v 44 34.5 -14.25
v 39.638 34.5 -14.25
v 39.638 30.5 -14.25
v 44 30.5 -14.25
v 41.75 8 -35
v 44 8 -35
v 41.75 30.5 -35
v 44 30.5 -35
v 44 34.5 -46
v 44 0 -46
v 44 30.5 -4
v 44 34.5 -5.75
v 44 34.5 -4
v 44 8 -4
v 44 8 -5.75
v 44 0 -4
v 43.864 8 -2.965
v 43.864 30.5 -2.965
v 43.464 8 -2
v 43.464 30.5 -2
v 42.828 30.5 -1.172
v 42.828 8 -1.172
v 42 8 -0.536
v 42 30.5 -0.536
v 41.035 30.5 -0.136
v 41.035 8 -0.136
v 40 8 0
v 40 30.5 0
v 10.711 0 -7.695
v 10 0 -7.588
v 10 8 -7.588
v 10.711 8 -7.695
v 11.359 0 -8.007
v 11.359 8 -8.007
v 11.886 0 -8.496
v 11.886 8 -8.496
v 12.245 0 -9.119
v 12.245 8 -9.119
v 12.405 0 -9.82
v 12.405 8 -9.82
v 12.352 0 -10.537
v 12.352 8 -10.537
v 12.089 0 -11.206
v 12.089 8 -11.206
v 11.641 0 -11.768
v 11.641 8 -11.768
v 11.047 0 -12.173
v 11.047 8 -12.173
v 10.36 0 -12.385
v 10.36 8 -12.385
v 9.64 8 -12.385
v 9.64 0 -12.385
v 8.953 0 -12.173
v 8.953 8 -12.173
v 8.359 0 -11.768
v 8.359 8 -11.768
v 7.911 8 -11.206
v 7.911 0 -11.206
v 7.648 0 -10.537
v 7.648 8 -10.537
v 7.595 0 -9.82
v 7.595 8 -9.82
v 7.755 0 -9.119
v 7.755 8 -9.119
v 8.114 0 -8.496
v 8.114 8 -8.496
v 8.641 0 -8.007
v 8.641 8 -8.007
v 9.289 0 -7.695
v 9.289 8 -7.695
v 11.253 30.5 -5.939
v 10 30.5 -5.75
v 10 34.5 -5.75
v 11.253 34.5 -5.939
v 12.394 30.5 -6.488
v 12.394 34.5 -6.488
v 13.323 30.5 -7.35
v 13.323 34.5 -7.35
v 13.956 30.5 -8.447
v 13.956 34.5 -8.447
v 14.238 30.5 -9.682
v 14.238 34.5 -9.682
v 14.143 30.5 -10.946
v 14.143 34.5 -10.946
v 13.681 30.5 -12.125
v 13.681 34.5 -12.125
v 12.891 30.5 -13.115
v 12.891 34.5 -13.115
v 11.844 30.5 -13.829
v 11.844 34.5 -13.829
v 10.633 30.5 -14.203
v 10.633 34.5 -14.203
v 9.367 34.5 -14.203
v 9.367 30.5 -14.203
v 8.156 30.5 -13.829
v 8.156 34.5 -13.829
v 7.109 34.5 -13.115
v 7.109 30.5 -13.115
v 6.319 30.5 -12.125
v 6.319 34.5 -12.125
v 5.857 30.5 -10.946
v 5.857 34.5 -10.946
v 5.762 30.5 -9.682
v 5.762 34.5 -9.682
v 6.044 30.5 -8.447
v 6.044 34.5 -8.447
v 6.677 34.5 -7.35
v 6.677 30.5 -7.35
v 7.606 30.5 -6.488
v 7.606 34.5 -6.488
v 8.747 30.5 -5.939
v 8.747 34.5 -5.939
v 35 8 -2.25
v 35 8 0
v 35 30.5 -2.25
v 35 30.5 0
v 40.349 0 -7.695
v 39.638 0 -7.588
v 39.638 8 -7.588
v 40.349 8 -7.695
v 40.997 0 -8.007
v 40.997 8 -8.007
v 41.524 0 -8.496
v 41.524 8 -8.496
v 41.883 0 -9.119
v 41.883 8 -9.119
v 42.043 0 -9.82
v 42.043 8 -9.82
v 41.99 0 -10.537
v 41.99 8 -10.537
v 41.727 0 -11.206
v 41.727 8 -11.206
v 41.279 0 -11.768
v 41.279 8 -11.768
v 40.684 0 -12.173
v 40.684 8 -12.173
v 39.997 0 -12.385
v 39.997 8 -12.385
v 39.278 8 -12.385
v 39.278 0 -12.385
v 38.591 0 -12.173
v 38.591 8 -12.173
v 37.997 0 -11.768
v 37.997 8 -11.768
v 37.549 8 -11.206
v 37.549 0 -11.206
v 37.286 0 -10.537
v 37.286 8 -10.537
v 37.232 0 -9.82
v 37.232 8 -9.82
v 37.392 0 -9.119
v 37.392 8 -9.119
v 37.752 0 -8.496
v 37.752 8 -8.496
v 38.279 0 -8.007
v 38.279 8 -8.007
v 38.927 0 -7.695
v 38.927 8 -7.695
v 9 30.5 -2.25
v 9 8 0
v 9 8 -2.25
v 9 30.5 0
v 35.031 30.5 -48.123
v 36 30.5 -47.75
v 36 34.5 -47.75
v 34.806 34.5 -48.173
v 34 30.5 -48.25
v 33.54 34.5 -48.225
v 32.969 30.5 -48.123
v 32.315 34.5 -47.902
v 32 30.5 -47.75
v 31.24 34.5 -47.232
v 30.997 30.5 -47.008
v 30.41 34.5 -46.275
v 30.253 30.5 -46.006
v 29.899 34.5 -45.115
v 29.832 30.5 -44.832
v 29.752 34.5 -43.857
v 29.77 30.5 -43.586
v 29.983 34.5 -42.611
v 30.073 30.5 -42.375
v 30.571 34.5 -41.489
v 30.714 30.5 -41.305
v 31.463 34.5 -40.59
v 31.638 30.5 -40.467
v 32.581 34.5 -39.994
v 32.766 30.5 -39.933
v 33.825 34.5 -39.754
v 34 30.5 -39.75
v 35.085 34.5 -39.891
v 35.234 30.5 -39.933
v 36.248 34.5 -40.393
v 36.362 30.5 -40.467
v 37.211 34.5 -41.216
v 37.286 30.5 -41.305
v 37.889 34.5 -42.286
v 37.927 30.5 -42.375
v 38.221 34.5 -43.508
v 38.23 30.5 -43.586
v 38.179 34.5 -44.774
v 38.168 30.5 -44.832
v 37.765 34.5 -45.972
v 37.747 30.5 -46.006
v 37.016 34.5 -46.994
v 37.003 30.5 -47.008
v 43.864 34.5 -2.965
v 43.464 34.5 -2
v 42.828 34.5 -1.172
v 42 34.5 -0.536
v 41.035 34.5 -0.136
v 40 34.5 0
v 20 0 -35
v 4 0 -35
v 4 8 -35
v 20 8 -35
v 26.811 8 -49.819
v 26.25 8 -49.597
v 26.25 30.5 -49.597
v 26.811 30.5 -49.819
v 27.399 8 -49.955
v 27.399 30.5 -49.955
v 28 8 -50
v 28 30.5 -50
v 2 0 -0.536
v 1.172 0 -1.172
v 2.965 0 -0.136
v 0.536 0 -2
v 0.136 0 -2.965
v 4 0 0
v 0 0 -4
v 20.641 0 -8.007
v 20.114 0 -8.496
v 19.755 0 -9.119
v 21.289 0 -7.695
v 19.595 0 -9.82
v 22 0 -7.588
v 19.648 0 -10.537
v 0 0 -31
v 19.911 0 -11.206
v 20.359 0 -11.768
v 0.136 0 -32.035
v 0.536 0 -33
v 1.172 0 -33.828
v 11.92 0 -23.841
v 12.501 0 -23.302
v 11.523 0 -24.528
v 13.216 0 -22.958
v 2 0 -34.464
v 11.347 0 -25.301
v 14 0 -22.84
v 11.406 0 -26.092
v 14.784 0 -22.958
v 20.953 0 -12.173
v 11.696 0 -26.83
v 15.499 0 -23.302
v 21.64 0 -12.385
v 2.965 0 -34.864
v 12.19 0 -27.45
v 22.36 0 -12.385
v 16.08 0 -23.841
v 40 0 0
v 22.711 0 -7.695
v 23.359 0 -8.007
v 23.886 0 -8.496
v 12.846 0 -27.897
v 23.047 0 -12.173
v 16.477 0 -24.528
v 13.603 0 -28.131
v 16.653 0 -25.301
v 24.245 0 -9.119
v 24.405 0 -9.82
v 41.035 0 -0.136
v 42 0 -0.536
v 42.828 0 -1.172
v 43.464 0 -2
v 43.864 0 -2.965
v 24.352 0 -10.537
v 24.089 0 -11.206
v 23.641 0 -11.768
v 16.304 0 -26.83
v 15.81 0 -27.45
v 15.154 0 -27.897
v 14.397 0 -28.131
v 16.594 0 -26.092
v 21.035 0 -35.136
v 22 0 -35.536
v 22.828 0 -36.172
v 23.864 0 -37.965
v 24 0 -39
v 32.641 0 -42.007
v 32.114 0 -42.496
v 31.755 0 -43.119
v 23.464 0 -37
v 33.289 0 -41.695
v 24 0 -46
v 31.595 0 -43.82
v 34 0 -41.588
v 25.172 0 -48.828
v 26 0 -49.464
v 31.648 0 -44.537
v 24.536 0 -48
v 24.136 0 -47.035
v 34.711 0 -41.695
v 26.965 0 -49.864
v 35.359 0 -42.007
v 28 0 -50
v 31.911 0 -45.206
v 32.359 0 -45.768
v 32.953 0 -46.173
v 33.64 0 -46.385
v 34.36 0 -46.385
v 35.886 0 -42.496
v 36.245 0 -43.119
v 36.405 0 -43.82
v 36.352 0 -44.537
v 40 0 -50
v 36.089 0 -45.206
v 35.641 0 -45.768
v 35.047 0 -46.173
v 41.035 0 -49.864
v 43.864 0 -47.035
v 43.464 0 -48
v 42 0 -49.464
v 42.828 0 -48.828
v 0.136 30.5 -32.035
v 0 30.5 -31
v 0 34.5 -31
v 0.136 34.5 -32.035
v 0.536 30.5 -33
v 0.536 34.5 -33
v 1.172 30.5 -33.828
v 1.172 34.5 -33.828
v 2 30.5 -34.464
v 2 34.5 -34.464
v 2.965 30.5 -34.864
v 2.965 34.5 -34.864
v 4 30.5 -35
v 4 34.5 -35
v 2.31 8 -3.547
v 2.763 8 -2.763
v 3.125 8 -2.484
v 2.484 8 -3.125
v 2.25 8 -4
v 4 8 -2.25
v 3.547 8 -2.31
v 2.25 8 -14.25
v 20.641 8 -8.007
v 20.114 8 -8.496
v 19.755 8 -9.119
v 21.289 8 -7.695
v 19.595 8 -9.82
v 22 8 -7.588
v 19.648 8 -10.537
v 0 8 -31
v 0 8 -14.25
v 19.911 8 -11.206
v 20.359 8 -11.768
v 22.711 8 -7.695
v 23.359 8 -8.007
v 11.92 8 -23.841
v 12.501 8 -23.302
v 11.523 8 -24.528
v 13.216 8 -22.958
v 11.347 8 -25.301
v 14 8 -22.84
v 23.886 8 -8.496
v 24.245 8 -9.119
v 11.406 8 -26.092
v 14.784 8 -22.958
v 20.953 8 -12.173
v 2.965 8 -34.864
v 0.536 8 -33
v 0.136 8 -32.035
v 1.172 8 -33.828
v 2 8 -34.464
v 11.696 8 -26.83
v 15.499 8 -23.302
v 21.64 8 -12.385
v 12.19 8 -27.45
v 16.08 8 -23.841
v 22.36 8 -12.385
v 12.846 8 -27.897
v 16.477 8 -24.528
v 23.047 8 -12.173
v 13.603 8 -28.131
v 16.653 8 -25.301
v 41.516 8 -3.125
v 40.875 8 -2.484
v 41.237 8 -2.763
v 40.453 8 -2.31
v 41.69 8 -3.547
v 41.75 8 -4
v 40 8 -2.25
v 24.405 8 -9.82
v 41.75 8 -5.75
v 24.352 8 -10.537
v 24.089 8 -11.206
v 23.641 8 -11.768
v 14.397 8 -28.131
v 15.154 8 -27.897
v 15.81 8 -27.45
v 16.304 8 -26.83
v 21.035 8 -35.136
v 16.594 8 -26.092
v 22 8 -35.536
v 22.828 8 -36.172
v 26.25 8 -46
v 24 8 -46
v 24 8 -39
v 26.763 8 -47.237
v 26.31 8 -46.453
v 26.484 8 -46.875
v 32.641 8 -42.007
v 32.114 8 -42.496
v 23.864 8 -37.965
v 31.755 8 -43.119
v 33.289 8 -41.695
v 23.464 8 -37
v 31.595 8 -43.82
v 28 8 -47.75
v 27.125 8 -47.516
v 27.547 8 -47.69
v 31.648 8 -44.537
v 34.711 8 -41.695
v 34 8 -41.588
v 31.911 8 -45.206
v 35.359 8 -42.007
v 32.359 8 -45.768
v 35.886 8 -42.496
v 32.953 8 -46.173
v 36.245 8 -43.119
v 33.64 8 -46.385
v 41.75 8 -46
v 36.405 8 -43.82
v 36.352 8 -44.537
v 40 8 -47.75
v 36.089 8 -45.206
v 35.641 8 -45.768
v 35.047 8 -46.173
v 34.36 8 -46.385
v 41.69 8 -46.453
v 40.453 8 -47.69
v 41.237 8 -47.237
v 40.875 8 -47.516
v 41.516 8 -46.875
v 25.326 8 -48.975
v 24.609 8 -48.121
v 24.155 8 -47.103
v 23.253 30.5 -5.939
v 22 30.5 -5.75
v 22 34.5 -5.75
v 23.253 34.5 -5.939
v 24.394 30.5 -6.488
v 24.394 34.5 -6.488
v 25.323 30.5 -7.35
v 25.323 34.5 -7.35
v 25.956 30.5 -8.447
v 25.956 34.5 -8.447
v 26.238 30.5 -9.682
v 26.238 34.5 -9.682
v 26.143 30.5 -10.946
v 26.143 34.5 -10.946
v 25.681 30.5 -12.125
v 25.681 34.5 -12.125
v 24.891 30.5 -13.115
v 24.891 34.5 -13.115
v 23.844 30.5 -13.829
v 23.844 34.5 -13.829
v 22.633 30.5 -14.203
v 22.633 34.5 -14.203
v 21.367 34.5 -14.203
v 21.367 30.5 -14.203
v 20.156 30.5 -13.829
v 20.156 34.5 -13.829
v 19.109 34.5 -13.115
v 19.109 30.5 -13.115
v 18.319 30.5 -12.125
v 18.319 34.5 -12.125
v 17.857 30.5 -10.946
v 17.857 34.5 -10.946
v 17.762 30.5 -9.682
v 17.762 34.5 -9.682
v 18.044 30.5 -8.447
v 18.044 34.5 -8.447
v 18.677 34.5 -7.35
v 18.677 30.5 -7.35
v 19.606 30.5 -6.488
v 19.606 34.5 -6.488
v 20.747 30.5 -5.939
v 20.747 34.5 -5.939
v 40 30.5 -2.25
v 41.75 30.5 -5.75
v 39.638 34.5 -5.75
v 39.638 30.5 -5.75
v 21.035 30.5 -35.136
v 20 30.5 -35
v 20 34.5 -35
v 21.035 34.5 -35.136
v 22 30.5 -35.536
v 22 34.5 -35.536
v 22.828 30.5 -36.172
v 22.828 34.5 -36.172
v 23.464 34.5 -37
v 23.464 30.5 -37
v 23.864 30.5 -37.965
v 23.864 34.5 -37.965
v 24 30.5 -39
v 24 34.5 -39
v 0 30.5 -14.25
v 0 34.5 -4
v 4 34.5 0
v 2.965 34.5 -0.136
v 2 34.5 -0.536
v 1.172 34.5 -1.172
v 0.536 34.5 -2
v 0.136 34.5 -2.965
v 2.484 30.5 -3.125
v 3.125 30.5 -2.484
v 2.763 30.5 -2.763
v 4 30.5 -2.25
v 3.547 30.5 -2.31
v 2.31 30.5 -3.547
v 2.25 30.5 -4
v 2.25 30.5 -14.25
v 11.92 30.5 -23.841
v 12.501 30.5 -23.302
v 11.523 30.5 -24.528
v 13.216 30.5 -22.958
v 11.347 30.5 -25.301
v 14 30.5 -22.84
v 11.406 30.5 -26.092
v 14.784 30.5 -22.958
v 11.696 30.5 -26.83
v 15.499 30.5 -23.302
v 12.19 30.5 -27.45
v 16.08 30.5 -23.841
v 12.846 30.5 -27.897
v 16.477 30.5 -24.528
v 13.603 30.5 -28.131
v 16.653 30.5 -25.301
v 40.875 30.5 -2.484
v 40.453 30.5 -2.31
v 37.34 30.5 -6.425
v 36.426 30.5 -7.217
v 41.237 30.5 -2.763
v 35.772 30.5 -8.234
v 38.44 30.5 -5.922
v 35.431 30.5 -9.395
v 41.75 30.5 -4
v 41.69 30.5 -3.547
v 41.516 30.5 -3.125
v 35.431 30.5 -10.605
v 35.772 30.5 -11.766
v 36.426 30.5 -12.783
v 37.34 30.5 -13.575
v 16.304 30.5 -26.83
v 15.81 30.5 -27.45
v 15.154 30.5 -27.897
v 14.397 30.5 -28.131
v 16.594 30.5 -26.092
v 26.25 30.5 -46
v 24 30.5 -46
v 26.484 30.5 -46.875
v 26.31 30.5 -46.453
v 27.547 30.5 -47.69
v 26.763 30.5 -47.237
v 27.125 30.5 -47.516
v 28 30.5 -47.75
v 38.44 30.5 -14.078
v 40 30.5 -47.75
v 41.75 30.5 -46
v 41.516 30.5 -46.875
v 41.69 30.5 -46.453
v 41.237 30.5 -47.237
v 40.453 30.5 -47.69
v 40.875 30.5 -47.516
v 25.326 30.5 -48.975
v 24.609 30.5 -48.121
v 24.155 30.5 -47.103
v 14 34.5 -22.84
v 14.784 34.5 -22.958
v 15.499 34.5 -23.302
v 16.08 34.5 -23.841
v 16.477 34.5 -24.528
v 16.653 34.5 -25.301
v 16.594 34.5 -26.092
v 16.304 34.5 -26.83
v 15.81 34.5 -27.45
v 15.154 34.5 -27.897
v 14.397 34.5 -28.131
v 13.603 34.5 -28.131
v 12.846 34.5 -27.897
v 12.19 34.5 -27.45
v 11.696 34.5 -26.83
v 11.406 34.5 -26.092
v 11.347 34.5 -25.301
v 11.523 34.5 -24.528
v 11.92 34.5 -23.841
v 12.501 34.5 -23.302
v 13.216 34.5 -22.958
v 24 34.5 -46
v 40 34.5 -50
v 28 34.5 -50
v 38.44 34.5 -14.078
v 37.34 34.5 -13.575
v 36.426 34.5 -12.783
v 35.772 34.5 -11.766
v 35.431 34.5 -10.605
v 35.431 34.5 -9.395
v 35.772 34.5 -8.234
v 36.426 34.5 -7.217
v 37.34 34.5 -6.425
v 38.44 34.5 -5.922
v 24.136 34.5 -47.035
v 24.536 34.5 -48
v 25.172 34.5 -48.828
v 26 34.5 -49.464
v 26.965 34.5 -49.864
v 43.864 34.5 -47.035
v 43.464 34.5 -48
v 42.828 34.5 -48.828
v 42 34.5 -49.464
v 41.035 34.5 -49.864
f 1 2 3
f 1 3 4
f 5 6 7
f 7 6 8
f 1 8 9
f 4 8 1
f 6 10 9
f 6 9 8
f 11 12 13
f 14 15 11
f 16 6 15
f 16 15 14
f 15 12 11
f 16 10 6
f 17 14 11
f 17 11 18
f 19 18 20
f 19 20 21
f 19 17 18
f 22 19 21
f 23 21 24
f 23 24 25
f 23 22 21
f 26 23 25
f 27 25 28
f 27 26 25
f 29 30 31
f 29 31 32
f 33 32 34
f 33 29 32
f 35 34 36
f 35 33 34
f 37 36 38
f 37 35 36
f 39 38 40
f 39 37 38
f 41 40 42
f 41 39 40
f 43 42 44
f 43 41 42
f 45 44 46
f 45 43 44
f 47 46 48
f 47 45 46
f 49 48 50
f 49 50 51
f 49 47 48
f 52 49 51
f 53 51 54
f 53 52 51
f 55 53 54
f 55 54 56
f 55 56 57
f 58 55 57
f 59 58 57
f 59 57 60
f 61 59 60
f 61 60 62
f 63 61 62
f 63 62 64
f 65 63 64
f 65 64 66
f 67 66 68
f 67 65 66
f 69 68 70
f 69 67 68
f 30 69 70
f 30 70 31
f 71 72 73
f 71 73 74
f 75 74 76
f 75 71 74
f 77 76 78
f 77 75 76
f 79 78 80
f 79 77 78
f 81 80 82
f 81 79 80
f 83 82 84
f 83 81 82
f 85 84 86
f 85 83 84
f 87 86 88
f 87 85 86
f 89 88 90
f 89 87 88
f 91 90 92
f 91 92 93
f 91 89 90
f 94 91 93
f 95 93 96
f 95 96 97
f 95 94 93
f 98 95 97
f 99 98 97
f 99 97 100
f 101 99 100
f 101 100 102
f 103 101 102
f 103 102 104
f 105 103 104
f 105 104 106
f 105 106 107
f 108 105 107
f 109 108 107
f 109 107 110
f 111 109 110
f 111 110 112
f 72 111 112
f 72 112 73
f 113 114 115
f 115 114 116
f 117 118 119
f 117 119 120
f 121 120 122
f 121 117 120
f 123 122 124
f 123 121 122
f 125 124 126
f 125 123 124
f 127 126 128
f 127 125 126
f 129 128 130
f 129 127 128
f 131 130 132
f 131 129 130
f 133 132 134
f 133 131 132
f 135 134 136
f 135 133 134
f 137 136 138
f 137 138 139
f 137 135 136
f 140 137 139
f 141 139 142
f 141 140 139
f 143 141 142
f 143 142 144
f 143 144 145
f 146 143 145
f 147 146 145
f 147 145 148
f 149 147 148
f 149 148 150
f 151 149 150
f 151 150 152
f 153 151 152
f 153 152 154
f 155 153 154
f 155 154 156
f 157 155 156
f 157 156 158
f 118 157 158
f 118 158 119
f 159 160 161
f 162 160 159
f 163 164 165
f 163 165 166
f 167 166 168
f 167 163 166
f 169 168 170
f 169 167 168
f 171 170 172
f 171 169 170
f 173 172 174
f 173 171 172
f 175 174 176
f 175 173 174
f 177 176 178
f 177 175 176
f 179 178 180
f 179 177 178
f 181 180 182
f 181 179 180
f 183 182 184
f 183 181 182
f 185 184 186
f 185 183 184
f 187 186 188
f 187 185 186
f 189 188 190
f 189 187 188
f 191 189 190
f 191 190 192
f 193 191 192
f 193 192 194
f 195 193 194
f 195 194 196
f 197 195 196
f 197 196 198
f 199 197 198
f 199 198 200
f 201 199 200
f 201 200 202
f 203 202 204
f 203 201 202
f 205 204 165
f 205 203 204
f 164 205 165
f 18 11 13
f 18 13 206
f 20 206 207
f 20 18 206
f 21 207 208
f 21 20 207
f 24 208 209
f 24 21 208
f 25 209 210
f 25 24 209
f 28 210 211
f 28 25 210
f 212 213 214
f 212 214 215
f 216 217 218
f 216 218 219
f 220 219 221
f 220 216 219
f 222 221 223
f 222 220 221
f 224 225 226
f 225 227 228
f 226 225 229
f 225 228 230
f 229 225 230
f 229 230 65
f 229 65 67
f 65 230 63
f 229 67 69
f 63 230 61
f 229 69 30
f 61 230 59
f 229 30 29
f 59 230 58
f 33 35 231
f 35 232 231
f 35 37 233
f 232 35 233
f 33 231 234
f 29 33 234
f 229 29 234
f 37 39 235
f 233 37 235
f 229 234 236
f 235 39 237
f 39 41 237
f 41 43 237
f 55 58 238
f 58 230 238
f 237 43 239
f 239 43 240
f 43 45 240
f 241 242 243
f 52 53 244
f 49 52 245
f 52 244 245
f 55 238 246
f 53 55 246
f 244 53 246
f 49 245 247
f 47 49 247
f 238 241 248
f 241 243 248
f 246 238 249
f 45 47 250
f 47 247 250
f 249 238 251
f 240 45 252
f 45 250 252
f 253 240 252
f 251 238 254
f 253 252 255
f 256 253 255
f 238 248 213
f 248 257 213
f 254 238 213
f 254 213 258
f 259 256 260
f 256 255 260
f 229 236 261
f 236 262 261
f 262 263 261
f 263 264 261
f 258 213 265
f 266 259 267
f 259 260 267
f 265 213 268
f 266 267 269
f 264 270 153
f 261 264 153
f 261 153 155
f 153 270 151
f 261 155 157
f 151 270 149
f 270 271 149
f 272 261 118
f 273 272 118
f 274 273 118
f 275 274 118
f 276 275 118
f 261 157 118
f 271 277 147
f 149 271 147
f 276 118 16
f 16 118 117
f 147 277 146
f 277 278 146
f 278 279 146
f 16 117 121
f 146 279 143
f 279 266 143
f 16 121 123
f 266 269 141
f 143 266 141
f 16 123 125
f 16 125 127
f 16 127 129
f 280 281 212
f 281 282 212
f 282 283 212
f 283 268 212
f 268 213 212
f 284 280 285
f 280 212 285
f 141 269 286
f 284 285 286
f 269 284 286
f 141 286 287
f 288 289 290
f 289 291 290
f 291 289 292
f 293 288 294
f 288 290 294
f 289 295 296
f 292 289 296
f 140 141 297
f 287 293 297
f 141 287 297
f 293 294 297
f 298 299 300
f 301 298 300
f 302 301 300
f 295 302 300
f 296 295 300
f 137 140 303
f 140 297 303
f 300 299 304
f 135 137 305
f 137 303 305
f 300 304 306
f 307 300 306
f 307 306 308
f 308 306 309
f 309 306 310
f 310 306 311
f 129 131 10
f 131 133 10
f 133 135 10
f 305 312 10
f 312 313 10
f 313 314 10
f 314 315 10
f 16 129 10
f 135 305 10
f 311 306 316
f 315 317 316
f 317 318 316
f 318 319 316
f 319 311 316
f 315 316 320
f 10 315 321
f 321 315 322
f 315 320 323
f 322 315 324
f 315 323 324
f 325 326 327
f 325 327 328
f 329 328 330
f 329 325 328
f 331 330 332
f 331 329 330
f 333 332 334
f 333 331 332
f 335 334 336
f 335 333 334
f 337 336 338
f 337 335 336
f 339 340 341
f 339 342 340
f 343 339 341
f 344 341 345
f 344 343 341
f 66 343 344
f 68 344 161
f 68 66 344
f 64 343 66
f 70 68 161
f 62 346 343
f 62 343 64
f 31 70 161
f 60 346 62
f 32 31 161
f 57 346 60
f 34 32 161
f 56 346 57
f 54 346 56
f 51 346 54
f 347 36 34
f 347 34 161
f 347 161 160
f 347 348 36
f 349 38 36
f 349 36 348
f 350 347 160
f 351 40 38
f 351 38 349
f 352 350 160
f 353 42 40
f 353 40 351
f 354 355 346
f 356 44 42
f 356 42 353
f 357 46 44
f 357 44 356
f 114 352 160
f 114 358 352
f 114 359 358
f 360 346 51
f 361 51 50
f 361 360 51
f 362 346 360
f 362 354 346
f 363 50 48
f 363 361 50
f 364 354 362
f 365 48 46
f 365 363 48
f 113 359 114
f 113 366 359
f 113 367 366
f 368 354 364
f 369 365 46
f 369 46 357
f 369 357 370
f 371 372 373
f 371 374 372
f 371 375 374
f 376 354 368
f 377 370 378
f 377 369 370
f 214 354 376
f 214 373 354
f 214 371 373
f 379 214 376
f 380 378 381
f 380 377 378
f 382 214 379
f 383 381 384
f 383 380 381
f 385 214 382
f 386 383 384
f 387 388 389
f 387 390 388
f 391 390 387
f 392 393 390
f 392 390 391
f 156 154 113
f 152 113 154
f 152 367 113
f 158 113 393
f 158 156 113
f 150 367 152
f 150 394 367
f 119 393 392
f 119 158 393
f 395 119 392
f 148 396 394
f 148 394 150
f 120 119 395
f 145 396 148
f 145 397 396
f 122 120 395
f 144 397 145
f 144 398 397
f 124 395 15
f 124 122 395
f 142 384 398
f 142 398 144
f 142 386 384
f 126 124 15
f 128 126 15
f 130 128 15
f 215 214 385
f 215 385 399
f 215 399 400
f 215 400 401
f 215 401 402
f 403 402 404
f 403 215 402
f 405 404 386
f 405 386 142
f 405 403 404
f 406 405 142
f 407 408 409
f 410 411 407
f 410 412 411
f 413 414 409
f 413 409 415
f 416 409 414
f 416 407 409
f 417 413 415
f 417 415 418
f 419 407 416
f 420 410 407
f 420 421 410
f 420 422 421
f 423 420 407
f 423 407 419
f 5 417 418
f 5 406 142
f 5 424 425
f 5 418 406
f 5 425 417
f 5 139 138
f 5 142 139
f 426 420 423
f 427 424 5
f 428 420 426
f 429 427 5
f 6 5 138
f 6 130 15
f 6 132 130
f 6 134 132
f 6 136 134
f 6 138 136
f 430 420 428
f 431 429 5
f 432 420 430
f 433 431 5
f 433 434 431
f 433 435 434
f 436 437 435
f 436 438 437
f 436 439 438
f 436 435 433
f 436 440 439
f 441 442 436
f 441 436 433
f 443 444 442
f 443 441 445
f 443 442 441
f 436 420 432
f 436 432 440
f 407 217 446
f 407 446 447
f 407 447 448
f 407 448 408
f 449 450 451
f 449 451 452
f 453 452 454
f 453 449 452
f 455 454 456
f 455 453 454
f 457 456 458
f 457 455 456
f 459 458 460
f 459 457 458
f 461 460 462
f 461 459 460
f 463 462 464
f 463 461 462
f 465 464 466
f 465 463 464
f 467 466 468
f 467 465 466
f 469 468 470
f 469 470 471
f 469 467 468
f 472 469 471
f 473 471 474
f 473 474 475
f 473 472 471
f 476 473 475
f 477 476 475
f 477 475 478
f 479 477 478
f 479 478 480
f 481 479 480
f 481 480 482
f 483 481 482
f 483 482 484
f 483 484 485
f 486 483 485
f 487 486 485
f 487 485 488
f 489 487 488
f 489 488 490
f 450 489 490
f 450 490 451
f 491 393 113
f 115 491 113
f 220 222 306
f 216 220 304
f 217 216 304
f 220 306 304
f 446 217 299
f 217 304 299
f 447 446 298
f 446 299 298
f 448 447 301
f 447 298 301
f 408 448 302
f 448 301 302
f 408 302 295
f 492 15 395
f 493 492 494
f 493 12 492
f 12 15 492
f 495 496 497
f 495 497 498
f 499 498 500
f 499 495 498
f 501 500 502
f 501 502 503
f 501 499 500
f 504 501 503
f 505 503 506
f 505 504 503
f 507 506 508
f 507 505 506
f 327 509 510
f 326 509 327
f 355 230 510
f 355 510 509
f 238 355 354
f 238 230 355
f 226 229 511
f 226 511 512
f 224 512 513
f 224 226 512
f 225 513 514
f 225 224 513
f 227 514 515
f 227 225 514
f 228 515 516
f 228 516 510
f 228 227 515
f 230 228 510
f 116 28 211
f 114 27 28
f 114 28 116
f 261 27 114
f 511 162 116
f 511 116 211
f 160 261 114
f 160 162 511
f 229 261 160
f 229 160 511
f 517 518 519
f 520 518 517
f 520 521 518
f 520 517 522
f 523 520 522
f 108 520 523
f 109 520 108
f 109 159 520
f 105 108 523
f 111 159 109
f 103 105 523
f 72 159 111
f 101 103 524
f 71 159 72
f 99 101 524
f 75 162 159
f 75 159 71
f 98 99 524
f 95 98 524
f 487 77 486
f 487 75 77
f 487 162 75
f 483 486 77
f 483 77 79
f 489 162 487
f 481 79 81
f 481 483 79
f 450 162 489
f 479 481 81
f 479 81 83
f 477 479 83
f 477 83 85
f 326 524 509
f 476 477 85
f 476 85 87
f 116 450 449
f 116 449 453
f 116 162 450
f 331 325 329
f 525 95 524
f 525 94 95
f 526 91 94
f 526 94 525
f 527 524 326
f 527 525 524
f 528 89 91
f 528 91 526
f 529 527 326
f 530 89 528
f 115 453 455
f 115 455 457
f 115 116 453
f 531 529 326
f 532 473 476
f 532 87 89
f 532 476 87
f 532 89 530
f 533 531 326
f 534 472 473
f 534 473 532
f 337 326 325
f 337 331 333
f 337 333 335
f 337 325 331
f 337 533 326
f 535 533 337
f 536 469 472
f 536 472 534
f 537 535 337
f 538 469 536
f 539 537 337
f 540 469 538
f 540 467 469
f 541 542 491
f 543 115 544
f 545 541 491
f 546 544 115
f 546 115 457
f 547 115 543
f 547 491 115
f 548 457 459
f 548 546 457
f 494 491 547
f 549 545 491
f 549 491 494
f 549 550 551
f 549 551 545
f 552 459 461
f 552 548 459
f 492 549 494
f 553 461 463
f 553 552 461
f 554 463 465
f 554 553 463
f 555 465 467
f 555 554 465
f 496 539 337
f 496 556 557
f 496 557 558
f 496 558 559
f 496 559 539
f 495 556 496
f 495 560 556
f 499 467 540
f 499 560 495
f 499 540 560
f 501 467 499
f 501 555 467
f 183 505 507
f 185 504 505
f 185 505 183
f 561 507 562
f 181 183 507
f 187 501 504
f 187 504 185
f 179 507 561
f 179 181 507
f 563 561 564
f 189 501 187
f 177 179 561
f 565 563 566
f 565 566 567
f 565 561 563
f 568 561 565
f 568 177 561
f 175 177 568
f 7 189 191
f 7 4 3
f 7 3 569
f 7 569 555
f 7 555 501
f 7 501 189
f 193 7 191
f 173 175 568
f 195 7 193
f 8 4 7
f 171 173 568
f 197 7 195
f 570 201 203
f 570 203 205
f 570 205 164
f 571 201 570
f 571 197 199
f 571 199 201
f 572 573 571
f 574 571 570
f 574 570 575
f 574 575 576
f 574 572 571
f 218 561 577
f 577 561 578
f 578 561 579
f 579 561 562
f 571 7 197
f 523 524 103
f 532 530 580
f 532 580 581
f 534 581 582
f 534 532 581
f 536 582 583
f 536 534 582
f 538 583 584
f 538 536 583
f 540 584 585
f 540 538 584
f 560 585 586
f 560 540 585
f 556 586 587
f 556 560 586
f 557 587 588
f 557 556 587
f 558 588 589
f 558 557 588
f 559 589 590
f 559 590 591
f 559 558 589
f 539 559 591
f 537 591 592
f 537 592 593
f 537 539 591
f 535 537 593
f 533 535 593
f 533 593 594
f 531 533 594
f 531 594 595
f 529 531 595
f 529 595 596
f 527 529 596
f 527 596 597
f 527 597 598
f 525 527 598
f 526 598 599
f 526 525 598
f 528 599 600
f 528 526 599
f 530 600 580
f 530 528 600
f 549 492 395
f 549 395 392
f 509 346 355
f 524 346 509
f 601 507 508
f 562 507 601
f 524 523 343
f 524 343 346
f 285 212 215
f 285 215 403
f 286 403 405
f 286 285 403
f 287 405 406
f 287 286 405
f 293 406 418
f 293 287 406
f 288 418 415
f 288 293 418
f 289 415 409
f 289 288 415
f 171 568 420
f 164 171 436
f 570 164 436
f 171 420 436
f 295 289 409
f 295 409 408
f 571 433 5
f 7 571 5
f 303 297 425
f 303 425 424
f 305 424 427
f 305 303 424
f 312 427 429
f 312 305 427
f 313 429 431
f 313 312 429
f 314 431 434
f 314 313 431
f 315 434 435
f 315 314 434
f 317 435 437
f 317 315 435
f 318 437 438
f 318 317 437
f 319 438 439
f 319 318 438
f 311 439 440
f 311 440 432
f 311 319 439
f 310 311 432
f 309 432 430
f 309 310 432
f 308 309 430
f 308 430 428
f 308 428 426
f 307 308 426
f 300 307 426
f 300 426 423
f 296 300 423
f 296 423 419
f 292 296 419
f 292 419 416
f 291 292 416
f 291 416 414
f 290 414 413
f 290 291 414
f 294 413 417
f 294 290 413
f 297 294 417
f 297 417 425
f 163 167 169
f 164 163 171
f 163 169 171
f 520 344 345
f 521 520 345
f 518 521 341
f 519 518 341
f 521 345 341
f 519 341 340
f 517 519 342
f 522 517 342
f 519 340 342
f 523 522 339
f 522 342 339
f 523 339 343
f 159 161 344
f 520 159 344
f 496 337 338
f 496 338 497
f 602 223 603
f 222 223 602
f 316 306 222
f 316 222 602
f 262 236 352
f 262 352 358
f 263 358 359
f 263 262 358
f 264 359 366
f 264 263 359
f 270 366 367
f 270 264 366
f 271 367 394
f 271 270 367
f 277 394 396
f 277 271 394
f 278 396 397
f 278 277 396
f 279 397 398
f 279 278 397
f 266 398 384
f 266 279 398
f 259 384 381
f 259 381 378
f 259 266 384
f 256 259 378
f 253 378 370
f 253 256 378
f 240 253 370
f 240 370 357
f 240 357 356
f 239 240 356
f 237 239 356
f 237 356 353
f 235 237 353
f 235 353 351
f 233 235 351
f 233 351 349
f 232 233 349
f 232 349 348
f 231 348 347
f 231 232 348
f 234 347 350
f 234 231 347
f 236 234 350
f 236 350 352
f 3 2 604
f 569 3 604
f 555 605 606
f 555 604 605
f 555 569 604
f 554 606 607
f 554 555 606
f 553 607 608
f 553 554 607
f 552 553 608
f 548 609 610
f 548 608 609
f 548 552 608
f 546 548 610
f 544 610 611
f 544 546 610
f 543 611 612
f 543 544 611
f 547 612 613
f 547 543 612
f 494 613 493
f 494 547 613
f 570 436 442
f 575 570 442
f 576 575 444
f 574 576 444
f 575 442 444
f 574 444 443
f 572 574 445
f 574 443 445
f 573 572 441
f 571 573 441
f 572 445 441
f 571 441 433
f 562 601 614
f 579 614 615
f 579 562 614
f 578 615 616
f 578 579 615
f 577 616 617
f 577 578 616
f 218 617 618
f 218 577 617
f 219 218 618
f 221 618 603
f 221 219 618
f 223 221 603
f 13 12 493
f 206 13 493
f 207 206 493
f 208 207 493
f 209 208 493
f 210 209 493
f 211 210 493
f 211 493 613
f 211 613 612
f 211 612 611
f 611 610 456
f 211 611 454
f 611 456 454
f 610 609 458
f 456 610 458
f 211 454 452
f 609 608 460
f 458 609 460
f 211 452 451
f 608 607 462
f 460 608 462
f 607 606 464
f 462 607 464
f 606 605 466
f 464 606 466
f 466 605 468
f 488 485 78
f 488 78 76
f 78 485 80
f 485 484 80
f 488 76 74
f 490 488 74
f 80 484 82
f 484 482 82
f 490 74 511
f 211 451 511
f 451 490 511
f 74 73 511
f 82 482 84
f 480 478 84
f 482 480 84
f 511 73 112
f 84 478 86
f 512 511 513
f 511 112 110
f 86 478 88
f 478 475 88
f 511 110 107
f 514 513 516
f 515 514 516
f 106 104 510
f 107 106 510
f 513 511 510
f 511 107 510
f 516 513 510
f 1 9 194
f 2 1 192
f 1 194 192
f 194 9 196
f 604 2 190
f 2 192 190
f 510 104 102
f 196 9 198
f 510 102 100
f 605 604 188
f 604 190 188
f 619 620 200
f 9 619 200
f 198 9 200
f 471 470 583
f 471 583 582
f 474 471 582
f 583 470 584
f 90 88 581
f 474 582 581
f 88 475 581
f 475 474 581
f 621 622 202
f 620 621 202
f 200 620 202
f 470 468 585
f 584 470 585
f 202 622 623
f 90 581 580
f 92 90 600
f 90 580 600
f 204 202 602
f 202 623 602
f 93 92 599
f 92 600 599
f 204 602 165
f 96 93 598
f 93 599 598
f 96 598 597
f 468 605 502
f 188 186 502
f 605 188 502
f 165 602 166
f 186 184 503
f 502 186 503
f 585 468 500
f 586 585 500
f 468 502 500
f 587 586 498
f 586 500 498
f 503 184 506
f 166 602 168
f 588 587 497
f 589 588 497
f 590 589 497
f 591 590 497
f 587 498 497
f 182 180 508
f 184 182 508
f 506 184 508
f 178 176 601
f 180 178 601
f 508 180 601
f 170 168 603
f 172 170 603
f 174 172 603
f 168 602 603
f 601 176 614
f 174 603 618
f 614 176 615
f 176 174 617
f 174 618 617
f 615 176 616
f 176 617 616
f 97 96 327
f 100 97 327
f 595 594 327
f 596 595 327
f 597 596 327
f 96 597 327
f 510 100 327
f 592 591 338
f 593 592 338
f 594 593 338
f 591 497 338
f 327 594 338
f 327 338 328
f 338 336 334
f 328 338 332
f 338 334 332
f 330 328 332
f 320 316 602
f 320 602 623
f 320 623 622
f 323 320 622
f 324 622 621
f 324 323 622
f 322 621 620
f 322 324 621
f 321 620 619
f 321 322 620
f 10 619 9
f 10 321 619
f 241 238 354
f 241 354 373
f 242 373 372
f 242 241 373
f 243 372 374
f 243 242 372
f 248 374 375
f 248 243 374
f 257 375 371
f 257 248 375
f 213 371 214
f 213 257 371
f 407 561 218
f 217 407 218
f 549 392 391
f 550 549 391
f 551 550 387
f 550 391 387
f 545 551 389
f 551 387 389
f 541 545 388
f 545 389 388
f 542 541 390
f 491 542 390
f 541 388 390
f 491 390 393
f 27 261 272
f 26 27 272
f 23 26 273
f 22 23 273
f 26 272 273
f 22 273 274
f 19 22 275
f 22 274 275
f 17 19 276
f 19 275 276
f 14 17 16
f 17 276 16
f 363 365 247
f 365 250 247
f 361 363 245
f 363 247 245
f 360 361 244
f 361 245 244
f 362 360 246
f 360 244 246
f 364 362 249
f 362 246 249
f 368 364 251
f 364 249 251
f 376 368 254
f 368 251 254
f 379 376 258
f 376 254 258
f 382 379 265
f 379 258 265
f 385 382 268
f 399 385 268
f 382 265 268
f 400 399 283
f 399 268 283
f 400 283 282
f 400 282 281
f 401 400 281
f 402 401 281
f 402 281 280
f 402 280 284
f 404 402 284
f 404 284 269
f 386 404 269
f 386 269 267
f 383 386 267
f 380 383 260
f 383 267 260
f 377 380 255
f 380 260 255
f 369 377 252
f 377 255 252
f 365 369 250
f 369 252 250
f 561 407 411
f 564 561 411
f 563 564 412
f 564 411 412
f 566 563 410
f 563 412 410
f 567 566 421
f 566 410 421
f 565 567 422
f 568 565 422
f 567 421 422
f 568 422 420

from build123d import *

# Parameters (mm, degrees)
SKETCH1_R           = 2.41215
SKETCH1_R_2         = 2.6605
BOSS_EXTRUDE1_DEPTH = 8
BOSS_EXTRUDE2_DEPTH = 22.5
CUT_EXTRUDE1_DEPTH  = 22.5
SKETCH4_R           = 4.25
SKETCH4_R_2         = 2.6605
BOSS_EXTRUDE3_DEPTH = 4
CUT_EXTRUDE2_REACH  = 77.008
SKETCH6_R           = 10
BOSS_EXTRUDE4_DEPTH = 6
SKETCH7_R           = 2.6605
SKETCH7_W           = 16
SKETCH7_H           = 5
CUT_EXTRUDE3_DEPTH  = 76.00833287
SKETCH8_W           = 20.75
SKETCH8_H           = 22.5
CUT_EXTRUDE4_DEPTH  = 76.00833287
SKETCH9_W           = 26
SKETCH9_H           = 22.5
CUT_EXTRUDE5_DEPTH  = 2.25


with BuildPart() as part:
    # Sketch1 → Boss-Extrude1 (new body)
    with BuildSketch(Plane(origin=(0, 0, 0), x_dir=(1, 0, 0), z_dir=(0, 1, 0))):
        with BuildLine():
            Line((4, 0), (40, 0))
            ThreePointArc((40, 0), (42.828427125, 1.171572875), (44, 4))
            Line((44, 4), (44, 46))
            ThreePointArc((44, 46), (42.828427125, 48.828427125), (40, 50))
            Line((40, 50), (28, 50))
            ThreePointArc((28, 50), (25.171572875, 48.828427125), (24, 46))
            Line((24, 46), (24, 39))
            ThreePointArc((24, 39), (22.828427125, 36.171572875), (20, 35))
            Line((20, 35), (4, 35))
            ThreePointArc((4, 35), (1.171572875, 33.828427125), (0, 31))
            Line((0, 31), (0, 4))
            ThreePointArc((0, 4), (1.171572875, 1.171572875), (4, 0))
        make_face()
        with Locations(Location((34, 44, 0), (0, 0, 270))):
            Circle(SKETCH1_R, mode=Mode.SUBTRACT)
        with Locations(Location((14, 25.5, 0), (0, 0, 270))):
            Circle(SKETCH1_R_2, mode=Mode.SUBTRACT)
        with Locations(Location((10, 10, 0), (0, 0, 270))):
            Circle(SKETCH1_R, mode=Mode.SUBTRACT)
        with Locations(Location((22, 10, 0), (0, 0, 270))):
            Circle(SKETCH1_R, mode=Mode.SUBTRACT)
        with Locations(Location((39.63785, 10, 0), (0, 0, 270))):
            Circle(SKETCH1_R, mode=Mode.SUBTRACT)
    extrude(amount=BOSS_EXTRUDE1_DEPTH)

    # Sketch2 → Boss-Extrude2 (add)
    with BuildSketch(Plane(origin=(0, 8, 0), x_dir=(1, 0, 0), z_dir=(0, 1, 0))):
        with BuildLine():
            Line((4, 35), (20, 35))
            ThreePointArc((20, 35), (22.828427125, 36.171572875), (24, 39))
            Line((24, 39), (24, 46))
            ThreePointArc((24, 46), (25.171572838, 48.828427121), (27.999999942, 50))
            Line((27.999999942, 50), (40, 50))
            ThreePointArc((40, 50), (42.828427125, 48.828427125), (44, 46))
            Line((44, 46), (44, 4))
            ThreePointArc((44, 4), (42.828426987, 1.171572862), (39.999999786, 0))
            Line((39.999999786, 0), (4, 0))
            ThreePointArc((4, 0), (1.171572875, 1.171572875), (0, 4))
            Line((0, 4), (0, 31))
            ThreePointArc((0, 31), (1.171572875, 33.828427125), (4, 35))
        make_face()
        with BuildLine():
            Line((41.75, 46), (41.75, 4.000000214))
            ThreePointArc((41.75, 4.000000214), (41.237436804, 2.762563196), (39.999999786, 2.25))
            Line((39.999999786, 2.25), (4, 2.25))
            ThreePointArc((4, 2.25), (2.762563133, 2.762563133), (2.25, 4))
            Line((2.25, 4), (2.25, 31))
            ThreePointArc((2.25, 31), (2.762563133, 32.237436867), (4, 32.75))
            Line((4, 32.75), (20, 32.75))
            ThreePointArc((20, 32.75), (24.419417382, 34.580582618), (26.25, 39))
            Line((26.25, 39), (26.25, 46.000000058))
            ThreePointArc((26.25, 46.000000058), (26.762563116, 47.237436884), (27.999999942, 47.75))
            Line((27.999999942, 47.75), (40, 47.75))
            ThreePointArc((40, 47.75), (41.237436867, 47.237436867), (41.75, 46))
        make_face(mode=Mode.SUBTRACT)
    extrude(amount=BOSS_EXTRUDE2_DEPTH)

    # Sketch3 → Cut-Extrude1 (cut)
    with BuildSketch(Plane(origin=(0, 30.5, 0), x_dir=(1, 0, 0), z_dir=(0, 1, 0))):
        with BuildLine():
            Line((26.25, 50), (14, 50))
            Line((14, 50), (14, 36.5))
            ThreePointArc((14, 36.5), (6.221825407, 33.278174593), (3, 25.5))
            Line((3, 25.5), (0, 25.5))
            Line((0, 25.5), (0, 14.5))
            Line((0, 14.5), (14, 14.5))
            ThreePointArc((14, 14.5), (21.778174593, 17.721825407), (25, 25.5))
            Line((25, 25.5), (26.25, 25.5))
            Line((26.25, 25.5), (26.25, 50))
        make_face()
    extrude(amount=-CUT_EXTRUDE1_DEPTH, mode=Mode.SUBTRACT)

    # Sketch4 → Boss-Extrude3 (add)
    with BuildSketch(Plane(origin=(0, 30.5, 0), x_dir=(1, 0, 0), z_dir=(0, 1, 0))):
        with BuildLine():
            Line((28, 50), (40, 50))
            ThreePointArc((40, 50), (42.828427125, 48.828427125), (44, 46))
            Line((44, 46), (44, 4))
            ThreePointArc((44, 4), (42.828427125, 1.171572875), (40, 0))
            Line((40, 0), (4, 0))
            ThreePointArc((4, 0), (1.171572875, 1.171572875), (0, 4))
            Line((0, 4), (0, 31))
            ThreePointArc((0, 31), (1.171572875, 33.828427125), (4, 35))
            Line((4, 35), (20, 35))
            ThreePointArc((20, 35), (22.828427125, 36.171572875), (24, 39))
            Line((24, 39), (24, 46))
            ThreePointArc((24, 46), (25.171572875, 48.828427125), (28, 50))
        make_face()
        with Locations(Location((34, 44, 0), (0, 0, 61.927513064))):
            Circle(SKETCH4_R, mode=Mode.SUBTRACT)
        with Locations(Location((14, 25.5, 0), (0, 0, 270))):
            Circle(SKETCH4_R_2, mode=Mode.SUBTRACT)
        with Locations(Location((22, 10, 0), (0, 0, 270))):
            Circle(SKETCH4_R, mode=Mode.SUBTRACT)
        with Locations(Location((10, 10, 0), (0, 0, 270))):
            Circle(SKETCH4_R, mode=Mode.SUBTRACT)
        with Locations(Location((39.63785, 10, 0), (0, 0, 60.199834302))):
            Circle(SKETCH4_R, mode=Mode.SUBTRACT)
    extrude(amount=BOSS_EXTRUDE3_DEPTH)

    # Cut-Extrude2: up to this face of the body (flat: up to its plane)
    cut_extrude2_end = Plane(part.part.faces().sort_by_distance((23.387741141, 8, -22.067767212))[0])
    # Sketch5 → Cut-Extrude2 (cut, up to the picked face)
    with BuildSketch(Plane(origin=(0, 34.5, 0), x_dir=(1, 0, 0), z_dir=(0, 1, 0)), mode=Mode.PRIVATE) as cut_extrude2_sk1:
        with BuildLine():
            Line((39.63785, 14.25), (44, 14.25))
            Line((44, 14.25), (44, 5.75))
            Line((44, 5.75), (39.63785, 5.75))
            ThreePointArc((39.63785, 5.75), (35.38785, 10), (39.63785, 14.25))
        make_face()
    cut_extrude2_tool1 = split(extrude(cut_extrude2_sk1.sketch, amount=-CUT_EXTRUDE2_REACH, mode=Mode.PRIVATE), bisect_by=cut_extrude2_end, keep=Keep.BOTH, mode=Mode.PRIVATE)
    add(cut_extrude2_tool1.solids().sort_by(Axis((40.091525, 34.5, -10), (0, -1, 0)))[0], mode=Mode.SUBTRACT)

    # Sketch6 → Boss-Extrude4 (add)
    with BuildSketch(Plane(origin=(0, 8, 0), x_dir=(1, 0, 0), z_dir=(0, 1, 0))):
        with Locations(Location((14, 25.5, 0), (0, 0, 108.194872339))):
            Circle(SKETCH6_R)
    extrude(amount=BOSS_EXTRUDE4_DEPTH)

    # Sketch7 → Cut-Extrude3 (cut, through all)
    with BuildSketch(Plane.XZ):
        with Locations(Location((14, -25.5, 0), (0, 0, 90))):
            Circle(SKETCH7_R)
        with Locations((12, -37.5)):
            Rectangle(SKETCH7_W, SKETCH7_H)
    extrude(amount=-CUT_EXTRUDE3_DEPTH, mode=Mode.SUBTRACT)

    # Sketch8 → Cut-Extrude4 (cut, through all)
    with BuildSketch(Plane(origin=(44, 0, 0), x_dir=(0, 0, -1), z_dir=(1, 0, 0))):
        with Locations((24.625, 19.25)):
            Rectangle(SKETCH8_W, SKETCH8_H)
    extrude(amount=-CUT_EXTRUDE4_DEPTH, mode=Mode.SUBTRACT)

    # Sketch9 → Cut-Extrude5 (cut)
    with BuildSketch(Plane.XY):
        with Locations((22, 19.25)):
            Rectangle(SKETCH9_W, SKETCH9_H)
    extrude(amount=-CUT_EXTRUDE5_DEPTH, mode=Mode.SUBTRACT)


solid = part.part
